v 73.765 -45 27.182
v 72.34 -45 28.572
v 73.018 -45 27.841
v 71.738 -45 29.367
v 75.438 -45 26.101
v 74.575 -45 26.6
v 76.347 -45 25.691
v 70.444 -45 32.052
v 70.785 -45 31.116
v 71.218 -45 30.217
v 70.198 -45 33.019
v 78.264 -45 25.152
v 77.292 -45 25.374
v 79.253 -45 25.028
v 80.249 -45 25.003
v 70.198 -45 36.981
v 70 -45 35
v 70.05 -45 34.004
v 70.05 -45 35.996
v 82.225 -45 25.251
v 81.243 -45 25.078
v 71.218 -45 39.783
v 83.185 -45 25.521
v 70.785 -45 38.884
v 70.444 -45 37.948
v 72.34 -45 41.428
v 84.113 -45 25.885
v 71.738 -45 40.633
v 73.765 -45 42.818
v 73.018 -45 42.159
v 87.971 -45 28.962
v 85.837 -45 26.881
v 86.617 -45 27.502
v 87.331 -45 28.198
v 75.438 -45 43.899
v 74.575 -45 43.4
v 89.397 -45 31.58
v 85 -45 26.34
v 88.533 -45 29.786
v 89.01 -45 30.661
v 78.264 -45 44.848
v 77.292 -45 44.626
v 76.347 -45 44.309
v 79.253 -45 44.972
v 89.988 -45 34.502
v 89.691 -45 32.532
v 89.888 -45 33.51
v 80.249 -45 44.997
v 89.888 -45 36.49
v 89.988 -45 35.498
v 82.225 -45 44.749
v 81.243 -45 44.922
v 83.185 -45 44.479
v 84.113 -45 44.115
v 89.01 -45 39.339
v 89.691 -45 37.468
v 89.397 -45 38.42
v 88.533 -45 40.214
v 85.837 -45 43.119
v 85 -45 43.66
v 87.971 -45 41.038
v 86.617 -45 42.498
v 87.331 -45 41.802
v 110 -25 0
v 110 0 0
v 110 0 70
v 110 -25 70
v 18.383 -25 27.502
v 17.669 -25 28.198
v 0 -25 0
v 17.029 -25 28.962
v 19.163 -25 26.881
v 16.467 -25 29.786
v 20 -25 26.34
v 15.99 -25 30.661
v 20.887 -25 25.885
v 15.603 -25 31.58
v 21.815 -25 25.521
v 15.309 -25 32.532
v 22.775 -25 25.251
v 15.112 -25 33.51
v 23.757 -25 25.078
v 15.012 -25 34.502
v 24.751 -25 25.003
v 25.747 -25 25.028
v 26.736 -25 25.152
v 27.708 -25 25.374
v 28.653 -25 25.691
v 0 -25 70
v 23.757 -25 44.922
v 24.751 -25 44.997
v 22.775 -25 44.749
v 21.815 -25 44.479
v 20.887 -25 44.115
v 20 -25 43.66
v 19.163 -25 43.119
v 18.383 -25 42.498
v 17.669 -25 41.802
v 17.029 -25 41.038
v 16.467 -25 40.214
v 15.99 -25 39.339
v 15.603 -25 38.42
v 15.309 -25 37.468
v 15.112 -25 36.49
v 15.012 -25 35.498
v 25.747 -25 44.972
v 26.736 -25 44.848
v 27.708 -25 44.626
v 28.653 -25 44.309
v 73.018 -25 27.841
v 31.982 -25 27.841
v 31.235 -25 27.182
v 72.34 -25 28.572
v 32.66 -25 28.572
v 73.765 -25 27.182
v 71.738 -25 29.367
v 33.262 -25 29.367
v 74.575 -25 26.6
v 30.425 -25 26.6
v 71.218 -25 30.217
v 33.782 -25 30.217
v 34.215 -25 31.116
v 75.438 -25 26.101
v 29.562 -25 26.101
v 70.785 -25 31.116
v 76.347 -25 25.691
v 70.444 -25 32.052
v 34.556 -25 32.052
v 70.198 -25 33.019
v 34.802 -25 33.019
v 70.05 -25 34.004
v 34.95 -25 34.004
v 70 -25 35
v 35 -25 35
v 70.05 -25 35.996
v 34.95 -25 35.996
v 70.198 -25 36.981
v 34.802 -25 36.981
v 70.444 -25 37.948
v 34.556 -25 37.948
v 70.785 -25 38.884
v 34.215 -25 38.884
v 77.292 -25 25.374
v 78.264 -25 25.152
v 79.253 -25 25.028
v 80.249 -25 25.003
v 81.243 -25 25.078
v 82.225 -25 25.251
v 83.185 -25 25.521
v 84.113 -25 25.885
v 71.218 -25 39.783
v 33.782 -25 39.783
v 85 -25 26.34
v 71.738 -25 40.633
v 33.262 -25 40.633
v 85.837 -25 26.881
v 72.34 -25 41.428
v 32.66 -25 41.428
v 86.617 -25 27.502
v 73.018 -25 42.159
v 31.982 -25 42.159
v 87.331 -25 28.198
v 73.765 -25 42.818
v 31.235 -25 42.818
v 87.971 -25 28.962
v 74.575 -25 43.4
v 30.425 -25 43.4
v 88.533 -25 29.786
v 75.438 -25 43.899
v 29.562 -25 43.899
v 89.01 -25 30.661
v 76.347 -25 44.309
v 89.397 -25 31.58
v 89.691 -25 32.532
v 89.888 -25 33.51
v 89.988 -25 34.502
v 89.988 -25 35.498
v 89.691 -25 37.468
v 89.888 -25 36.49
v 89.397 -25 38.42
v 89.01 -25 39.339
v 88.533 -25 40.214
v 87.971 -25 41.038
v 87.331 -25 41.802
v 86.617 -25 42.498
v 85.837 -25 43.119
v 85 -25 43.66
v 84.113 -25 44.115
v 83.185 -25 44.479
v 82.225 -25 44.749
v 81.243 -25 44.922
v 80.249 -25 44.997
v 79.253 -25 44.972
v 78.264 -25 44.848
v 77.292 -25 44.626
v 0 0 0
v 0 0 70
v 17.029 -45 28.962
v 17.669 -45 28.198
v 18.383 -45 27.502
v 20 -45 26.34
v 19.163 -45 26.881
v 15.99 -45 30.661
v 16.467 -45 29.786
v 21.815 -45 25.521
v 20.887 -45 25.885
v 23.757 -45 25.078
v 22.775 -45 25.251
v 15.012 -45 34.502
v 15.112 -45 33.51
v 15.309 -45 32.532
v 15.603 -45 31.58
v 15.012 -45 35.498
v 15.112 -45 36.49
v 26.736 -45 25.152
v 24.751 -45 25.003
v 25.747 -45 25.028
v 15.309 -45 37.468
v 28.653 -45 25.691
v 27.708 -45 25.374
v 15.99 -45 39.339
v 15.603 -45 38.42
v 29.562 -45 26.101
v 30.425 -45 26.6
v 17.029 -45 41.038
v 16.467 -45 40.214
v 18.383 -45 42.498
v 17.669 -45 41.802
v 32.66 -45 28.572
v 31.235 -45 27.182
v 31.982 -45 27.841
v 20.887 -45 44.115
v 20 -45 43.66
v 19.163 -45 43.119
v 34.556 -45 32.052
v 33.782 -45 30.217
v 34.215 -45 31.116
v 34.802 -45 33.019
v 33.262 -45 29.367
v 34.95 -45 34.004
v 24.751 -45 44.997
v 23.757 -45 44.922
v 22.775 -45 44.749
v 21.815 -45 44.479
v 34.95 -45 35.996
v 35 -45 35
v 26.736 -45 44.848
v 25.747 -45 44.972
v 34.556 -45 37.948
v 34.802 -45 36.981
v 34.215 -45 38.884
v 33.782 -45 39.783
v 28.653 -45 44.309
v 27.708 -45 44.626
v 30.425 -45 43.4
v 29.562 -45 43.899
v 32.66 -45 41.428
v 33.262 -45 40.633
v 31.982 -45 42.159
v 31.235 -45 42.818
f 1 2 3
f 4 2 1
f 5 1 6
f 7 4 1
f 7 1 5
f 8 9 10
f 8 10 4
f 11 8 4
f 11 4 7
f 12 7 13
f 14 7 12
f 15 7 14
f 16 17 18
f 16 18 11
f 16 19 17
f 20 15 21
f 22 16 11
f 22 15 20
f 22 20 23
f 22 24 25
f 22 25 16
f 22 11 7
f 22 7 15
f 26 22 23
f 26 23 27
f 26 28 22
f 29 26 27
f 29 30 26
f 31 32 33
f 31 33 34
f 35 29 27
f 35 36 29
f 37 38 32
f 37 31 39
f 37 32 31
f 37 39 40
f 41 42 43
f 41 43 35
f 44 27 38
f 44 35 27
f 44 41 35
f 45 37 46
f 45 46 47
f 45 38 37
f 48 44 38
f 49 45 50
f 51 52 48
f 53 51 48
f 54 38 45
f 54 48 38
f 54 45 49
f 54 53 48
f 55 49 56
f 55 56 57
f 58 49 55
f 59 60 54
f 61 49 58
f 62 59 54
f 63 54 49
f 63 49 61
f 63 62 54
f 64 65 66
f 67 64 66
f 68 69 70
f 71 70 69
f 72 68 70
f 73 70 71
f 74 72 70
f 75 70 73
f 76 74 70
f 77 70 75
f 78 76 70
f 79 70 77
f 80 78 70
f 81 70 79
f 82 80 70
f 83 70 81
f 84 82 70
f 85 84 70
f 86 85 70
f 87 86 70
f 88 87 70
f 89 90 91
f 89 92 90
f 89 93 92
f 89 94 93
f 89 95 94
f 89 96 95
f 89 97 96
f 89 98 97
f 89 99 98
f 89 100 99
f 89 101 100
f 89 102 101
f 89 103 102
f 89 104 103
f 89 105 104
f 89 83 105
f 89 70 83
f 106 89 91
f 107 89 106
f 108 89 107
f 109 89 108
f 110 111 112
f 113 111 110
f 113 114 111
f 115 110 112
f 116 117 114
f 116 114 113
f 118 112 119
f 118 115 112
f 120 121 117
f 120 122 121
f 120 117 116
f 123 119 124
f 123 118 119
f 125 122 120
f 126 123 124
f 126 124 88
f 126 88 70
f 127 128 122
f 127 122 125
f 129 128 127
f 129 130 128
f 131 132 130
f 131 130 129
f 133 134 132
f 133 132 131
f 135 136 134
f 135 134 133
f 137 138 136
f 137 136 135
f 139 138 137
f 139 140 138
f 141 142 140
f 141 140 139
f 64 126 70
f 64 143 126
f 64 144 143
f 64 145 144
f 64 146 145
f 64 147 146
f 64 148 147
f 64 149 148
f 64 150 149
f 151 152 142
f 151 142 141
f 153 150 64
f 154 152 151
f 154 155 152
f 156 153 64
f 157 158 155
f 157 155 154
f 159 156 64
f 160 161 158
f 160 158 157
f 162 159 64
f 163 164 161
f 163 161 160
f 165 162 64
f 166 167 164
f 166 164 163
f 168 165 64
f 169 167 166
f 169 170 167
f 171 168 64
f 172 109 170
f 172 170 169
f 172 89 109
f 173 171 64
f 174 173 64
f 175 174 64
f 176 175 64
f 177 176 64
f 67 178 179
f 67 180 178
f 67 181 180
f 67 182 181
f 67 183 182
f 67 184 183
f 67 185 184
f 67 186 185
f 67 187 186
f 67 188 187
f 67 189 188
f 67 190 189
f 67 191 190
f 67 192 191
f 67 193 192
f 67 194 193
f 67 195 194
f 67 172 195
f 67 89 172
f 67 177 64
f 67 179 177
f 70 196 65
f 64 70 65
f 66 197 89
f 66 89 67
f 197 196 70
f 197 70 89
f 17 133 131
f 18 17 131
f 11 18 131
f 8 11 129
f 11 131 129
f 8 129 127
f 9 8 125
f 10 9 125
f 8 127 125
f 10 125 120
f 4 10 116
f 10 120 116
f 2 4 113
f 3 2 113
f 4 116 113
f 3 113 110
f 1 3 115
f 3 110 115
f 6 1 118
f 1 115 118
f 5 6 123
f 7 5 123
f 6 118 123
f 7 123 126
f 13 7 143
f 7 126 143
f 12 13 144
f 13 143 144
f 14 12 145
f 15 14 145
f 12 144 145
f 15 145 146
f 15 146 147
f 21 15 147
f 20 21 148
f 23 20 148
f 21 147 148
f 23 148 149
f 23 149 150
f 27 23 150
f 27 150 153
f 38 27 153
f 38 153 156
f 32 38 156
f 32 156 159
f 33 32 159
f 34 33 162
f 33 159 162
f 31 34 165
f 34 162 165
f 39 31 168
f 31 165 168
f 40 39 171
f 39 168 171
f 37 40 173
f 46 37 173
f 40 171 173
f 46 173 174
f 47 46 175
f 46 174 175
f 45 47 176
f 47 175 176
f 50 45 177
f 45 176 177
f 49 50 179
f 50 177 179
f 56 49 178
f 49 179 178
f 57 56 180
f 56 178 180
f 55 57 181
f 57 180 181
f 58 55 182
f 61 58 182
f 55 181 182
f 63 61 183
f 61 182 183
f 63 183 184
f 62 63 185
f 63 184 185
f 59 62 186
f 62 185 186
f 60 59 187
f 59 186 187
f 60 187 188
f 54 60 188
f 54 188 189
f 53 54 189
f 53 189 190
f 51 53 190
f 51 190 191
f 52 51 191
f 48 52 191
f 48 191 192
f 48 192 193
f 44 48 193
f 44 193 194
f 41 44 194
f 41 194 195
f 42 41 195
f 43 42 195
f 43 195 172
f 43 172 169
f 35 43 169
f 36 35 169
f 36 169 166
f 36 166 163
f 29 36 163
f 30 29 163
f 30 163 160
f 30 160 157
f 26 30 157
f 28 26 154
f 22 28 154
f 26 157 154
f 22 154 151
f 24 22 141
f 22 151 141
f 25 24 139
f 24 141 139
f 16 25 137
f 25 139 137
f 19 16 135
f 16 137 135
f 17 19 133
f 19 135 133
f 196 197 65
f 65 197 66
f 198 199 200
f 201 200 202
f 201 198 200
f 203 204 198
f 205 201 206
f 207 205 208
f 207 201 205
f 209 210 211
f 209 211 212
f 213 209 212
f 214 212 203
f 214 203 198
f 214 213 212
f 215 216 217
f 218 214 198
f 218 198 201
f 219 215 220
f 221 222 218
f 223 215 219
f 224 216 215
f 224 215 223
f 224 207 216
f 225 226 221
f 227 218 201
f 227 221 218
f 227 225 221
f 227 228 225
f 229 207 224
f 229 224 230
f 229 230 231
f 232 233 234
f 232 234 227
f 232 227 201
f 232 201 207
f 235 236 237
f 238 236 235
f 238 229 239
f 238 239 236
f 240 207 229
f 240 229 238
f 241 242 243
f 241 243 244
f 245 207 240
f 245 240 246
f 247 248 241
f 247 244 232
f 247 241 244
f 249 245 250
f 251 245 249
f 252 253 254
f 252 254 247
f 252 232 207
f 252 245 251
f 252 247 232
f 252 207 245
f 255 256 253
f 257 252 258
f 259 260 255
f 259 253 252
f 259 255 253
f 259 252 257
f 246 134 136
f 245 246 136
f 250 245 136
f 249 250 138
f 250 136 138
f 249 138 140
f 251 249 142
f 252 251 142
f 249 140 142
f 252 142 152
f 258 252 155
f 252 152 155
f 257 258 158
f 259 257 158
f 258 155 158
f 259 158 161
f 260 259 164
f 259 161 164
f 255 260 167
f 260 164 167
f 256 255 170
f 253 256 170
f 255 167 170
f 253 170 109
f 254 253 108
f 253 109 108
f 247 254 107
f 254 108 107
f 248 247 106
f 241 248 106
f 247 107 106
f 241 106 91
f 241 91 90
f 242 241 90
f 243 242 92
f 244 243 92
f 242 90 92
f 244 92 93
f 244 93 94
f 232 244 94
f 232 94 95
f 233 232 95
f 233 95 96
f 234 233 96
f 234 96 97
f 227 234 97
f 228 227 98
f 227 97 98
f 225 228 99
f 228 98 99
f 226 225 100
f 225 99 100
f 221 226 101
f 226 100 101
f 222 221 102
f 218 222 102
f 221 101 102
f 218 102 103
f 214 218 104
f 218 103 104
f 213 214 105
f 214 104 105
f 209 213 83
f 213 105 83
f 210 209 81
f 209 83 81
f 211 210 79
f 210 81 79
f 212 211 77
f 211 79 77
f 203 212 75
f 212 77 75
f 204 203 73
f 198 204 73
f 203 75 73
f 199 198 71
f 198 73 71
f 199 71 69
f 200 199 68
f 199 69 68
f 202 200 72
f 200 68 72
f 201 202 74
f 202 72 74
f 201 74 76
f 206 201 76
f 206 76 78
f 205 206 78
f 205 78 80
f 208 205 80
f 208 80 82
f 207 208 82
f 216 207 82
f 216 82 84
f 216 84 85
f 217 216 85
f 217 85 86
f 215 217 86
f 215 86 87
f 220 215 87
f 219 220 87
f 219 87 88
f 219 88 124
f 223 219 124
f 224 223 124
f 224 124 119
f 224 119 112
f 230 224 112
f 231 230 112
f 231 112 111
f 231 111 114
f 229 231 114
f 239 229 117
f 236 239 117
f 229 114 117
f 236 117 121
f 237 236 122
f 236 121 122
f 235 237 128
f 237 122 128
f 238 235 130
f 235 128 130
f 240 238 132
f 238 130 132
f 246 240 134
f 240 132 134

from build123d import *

# Parameters (mm, degrees)
F0_W     = 110
F0_H     = 70
F1_DEPTH = 25
F2_R     = 10
F3_DEPTH = 20


with BuildPart() as f1:
    # F0 (on Front) → F1 (new body)
    with BuildSketch(Plane.XZ):
        with Locations((55, 35)):
            Rectangle(F0_W, F0_H)
    extrude(amount=F1_DEPTH)

    # F2 (on face) → F3 (join)
    with BuildSketch(Plane.XZ.offset(25)):
        with Locations((25, 35)):
            Circle(F2_R)
        with BuildLine():
            ThreePointArc((90, 35), (80, 45), (70, 35))
            ThreePointArc((70, 35), (80, 25), (90, 35))
        make_face()
    extrude(amount=F3_DEPTH)


solid = f1.part
